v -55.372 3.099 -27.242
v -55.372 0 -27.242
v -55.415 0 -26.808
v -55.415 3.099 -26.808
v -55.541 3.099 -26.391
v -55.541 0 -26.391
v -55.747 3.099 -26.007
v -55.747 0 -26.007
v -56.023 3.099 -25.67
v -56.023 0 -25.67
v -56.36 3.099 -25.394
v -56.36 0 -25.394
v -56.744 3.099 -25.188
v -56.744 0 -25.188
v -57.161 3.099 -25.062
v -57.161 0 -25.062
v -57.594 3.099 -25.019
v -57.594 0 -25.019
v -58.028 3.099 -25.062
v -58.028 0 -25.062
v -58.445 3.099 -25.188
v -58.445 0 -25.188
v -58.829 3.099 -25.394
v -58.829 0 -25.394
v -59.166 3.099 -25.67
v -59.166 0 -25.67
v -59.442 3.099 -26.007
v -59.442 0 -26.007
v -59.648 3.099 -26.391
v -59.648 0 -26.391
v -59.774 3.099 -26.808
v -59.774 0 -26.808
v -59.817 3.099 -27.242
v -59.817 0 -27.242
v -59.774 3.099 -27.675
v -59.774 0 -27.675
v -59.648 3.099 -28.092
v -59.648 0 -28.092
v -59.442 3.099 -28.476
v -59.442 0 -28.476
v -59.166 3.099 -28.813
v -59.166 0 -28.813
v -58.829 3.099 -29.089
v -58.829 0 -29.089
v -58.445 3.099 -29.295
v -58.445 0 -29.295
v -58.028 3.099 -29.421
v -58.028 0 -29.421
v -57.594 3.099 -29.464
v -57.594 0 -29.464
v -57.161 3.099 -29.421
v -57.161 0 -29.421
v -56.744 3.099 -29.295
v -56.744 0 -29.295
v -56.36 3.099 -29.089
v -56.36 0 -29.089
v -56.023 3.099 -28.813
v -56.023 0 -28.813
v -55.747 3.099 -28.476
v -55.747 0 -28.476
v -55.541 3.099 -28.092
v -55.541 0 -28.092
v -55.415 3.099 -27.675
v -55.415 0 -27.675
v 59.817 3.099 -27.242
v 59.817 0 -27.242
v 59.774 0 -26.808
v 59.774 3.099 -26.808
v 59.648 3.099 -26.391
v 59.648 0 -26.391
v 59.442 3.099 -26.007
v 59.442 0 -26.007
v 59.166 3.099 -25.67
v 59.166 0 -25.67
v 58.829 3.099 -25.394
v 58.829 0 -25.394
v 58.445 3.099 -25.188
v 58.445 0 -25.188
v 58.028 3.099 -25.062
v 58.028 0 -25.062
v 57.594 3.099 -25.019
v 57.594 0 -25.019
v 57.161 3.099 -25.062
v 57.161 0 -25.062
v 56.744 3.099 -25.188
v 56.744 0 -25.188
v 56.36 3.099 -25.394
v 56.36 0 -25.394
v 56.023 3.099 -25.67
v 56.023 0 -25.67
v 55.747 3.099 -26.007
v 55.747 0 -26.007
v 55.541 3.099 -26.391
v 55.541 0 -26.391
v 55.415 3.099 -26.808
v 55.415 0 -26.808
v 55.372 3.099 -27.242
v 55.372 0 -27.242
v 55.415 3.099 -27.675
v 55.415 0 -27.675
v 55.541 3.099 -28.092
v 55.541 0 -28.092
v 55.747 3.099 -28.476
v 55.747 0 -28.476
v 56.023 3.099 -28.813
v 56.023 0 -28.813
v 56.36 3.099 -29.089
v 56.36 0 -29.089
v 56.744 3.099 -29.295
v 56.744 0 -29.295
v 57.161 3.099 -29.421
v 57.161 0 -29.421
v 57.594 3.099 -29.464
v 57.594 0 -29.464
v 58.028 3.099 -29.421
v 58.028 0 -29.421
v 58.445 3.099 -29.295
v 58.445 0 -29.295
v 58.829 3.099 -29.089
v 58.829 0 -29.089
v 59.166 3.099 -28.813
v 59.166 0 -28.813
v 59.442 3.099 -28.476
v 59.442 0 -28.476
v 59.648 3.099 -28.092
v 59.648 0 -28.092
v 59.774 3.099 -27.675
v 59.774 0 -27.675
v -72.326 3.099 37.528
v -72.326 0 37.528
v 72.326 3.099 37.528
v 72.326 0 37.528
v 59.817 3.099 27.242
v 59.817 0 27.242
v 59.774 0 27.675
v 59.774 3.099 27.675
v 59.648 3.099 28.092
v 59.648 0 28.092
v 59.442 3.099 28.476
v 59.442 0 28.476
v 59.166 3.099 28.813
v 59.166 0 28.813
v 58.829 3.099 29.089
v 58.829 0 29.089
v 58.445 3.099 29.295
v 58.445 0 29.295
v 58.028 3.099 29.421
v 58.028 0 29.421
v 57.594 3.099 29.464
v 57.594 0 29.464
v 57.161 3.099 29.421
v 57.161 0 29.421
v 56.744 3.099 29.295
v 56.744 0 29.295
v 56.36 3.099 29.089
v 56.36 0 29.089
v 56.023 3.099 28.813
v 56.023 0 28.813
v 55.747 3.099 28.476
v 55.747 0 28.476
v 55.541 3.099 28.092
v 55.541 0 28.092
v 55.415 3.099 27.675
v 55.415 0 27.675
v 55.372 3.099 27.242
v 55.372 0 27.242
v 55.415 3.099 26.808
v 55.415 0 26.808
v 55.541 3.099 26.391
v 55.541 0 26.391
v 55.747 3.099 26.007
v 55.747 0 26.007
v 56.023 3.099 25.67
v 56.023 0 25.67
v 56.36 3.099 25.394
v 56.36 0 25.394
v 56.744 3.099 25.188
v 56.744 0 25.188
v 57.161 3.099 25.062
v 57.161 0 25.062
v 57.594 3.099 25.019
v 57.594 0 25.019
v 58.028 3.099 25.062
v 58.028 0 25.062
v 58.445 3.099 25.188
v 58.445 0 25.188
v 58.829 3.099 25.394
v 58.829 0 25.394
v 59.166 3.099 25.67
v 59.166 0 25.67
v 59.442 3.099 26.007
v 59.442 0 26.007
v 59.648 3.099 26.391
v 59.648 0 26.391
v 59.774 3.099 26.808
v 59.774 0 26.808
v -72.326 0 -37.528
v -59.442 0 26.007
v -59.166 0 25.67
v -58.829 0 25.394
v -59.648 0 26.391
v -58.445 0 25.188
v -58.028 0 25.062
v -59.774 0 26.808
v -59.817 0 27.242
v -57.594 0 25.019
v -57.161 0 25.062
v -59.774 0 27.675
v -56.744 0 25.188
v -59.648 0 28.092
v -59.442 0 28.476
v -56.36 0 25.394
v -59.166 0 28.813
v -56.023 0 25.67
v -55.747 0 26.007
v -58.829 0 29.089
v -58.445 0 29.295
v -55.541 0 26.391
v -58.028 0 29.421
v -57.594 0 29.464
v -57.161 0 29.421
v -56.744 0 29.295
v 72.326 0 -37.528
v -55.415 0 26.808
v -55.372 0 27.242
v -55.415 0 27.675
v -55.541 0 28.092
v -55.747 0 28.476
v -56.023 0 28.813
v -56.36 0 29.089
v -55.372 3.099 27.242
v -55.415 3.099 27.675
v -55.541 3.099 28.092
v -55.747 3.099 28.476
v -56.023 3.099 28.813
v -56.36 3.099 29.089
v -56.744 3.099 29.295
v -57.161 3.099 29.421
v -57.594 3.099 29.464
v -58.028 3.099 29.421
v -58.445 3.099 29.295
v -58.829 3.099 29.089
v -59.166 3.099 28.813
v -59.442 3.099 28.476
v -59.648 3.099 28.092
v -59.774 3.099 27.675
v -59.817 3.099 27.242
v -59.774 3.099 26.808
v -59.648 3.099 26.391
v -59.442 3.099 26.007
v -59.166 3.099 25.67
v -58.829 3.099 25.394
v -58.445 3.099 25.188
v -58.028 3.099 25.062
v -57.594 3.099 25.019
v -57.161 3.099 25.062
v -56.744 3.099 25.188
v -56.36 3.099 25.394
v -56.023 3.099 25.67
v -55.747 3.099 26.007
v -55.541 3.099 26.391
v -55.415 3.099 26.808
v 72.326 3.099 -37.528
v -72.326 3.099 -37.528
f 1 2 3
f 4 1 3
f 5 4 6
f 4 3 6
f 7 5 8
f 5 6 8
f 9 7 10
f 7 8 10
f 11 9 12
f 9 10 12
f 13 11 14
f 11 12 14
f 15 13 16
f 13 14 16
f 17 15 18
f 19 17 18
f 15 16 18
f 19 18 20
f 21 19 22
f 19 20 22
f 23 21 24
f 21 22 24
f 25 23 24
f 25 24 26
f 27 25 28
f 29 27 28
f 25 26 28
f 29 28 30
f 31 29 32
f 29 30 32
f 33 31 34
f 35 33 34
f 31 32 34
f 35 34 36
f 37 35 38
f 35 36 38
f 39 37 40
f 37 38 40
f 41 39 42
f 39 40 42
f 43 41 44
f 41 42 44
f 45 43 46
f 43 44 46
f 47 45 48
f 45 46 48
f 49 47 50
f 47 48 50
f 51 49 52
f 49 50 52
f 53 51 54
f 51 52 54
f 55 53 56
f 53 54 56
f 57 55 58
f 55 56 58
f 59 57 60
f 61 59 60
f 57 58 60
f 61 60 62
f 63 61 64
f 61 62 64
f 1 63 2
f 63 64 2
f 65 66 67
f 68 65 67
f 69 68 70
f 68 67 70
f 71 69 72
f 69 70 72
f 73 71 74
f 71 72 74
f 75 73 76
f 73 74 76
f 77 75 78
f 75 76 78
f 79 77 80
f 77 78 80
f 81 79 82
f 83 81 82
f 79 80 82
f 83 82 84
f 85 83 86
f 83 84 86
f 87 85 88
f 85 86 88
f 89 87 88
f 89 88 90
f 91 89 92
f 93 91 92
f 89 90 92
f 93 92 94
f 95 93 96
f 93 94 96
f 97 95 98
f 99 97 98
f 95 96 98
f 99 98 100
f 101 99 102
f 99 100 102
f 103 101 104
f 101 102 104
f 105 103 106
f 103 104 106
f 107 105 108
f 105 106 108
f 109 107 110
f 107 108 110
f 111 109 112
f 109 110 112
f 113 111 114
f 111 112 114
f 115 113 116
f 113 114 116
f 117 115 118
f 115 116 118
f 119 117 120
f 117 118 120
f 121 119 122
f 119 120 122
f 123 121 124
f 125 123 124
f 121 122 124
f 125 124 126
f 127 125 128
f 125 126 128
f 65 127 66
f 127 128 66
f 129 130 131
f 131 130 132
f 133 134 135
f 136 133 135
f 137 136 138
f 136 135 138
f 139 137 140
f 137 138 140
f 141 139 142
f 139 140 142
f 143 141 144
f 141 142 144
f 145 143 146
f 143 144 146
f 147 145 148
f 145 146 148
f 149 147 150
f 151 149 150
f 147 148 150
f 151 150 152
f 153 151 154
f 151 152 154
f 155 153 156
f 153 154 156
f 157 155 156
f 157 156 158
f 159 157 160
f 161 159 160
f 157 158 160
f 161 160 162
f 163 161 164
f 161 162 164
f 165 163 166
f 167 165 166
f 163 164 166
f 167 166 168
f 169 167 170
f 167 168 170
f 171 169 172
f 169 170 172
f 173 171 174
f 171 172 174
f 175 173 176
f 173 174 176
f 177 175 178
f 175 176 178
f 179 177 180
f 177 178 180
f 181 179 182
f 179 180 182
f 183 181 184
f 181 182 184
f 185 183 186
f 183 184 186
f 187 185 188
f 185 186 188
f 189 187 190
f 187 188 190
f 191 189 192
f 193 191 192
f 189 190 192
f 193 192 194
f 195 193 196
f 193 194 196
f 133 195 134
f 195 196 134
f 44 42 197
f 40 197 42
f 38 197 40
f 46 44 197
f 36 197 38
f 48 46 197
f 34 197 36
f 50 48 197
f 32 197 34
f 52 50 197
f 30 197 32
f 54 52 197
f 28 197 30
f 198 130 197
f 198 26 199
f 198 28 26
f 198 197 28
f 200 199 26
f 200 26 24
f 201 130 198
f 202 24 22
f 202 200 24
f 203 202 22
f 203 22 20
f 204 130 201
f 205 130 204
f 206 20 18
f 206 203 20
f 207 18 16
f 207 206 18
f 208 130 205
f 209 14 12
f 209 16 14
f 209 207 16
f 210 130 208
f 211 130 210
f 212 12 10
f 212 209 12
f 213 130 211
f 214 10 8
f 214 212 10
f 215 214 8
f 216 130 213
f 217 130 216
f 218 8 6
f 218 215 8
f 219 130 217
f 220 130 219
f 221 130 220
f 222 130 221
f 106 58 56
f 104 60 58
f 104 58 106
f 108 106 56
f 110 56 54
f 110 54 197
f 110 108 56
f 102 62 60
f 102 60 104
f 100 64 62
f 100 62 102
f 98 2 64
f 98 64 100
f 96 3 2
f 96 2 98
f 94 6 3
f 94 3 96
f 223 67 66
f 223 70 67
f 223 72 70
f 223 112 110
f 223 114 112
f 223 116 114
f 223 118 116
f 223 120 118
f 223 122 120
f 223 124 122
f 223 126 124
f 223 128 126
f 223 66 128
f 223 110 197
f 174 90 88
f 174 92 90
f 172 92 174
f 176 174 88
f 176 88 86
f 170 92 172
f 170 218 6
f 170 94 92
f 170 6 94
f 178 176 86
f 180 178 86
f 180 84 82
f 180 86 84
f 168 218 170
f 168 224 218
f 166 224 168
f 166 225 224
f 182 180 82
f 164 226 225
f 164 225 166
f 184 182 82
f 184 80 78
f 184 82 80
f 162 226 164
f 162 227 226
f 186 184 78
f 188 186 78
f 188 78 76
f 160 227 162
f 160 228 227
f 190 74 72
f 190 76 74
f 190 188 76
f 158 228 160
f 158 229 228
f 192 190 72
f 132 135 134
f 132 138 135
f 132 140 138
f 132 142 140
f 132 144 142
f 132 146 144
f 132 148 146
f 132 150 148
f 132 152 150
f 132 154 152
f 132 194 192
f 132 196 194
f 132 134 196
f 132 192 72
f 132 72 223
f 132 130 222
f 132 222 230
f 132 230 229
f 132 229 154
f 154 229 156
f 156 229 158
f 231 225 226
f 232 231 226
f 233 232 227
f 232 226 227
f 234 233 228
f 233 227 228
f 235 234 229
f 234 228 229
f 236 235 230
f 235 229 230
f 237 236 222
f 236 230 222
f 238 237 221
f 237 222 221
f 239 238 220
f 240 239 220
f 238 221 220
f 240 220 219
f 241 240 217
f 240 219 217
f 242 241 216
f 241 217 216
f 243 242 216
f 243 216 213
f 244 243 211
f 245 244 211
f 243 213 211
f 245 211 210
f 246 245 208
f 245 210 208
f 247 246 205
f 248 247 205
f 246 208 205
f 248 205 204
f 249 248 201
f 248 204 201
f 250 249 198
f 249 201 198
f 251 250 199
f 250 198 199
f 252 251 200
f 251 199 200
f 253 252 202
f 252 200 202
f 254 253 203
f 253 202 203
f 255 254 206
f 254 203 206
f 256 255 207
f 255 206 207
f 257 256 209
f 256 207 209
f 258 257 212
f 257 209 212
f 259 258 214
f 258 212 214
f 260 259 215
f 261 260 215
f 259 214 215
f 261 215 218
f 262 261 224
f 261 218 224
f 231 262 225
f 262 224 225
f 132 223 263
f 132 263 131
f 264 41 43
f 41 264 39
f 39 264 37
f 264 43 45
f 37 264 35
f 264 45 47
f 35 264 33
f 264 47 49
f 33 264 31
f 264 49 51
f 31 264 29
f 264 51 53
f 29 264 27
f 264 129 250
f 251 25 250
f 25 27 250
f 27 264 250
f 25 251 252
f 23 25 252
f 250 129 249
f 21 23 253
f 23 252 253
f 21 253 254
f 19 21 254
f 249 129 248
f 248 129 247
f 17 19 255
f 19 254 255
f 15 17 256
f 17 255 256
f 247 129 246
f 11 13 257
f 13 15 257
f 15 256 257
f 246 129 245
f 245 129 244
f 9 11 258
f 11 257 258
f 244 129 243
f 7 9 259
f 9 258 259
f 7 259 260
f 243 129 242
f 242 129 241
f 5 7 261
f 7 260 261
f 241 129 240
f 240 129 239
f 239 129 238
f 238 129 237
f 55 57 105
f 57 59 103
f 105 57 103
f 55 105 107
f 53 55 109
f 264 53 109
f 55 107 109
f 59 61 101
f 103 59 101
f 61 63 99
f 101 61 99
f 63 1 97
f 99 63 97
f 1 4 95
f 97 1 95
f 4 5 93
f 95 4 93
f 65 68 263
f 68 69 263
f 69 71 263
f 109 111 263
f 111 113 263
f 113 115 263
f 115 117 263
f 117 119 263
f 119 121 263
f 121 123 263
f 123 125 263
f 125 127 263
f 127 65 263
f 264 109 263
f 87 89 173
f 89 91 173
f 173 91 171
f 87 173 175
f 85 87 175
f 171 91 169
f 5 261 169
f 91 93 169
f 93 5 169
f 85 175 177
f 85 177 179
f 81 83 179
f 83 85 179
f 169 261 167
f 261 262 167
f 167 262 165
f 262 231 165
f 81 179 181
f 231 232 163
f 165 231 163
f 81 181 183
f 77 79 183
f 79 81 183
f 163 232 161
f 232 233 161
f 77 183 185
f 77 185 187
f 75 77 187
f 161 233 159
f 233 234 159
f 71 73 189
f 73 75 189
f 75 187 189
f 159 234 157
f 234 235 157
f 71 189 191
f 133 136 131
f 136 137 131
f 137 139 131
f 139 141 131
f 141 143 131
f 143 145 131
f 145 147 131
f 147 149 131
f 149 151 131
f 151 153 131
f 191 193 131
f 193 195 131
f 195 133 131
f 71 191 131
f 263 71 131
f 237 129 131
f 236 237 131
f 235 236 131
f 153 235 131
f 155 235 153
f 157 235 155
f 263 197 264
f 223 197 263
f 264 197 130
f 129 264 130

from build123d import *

# Parameters (mm, degrees)
F0_W     = 144.653
F0_H     = 75.057
F1_DEPTH = 3.0988
F2_R     = 2.2225
F3_DEPTH = 3.0988


with BuildPart() as f1:
    # F0 (on Front) → F1 (new body)
    with BuildSketch(Plane.XZ):
        Rectangle(F0_W, F0_H)
    extrude(amount=-F1_DEPTH)

    # F2 (on face) → F3 (cut, through all)
    with BuildSketch(Plane.XZ):
        with Locations((-57.5945, 27.2415)):
            Circle(F2_R)
        with Locations((-57.5945, -27.2415)):
            Circle(F2_R)
        with Locations((57.5945, -27.2415)):
            Circle(F2_R)
        with Locations((57.5945, 27.2415)):
            Circle(F2_R)
    extrude(amount=-F3_DEPTH, mode=Mode.SUBTRACT)


solid = f1.part
